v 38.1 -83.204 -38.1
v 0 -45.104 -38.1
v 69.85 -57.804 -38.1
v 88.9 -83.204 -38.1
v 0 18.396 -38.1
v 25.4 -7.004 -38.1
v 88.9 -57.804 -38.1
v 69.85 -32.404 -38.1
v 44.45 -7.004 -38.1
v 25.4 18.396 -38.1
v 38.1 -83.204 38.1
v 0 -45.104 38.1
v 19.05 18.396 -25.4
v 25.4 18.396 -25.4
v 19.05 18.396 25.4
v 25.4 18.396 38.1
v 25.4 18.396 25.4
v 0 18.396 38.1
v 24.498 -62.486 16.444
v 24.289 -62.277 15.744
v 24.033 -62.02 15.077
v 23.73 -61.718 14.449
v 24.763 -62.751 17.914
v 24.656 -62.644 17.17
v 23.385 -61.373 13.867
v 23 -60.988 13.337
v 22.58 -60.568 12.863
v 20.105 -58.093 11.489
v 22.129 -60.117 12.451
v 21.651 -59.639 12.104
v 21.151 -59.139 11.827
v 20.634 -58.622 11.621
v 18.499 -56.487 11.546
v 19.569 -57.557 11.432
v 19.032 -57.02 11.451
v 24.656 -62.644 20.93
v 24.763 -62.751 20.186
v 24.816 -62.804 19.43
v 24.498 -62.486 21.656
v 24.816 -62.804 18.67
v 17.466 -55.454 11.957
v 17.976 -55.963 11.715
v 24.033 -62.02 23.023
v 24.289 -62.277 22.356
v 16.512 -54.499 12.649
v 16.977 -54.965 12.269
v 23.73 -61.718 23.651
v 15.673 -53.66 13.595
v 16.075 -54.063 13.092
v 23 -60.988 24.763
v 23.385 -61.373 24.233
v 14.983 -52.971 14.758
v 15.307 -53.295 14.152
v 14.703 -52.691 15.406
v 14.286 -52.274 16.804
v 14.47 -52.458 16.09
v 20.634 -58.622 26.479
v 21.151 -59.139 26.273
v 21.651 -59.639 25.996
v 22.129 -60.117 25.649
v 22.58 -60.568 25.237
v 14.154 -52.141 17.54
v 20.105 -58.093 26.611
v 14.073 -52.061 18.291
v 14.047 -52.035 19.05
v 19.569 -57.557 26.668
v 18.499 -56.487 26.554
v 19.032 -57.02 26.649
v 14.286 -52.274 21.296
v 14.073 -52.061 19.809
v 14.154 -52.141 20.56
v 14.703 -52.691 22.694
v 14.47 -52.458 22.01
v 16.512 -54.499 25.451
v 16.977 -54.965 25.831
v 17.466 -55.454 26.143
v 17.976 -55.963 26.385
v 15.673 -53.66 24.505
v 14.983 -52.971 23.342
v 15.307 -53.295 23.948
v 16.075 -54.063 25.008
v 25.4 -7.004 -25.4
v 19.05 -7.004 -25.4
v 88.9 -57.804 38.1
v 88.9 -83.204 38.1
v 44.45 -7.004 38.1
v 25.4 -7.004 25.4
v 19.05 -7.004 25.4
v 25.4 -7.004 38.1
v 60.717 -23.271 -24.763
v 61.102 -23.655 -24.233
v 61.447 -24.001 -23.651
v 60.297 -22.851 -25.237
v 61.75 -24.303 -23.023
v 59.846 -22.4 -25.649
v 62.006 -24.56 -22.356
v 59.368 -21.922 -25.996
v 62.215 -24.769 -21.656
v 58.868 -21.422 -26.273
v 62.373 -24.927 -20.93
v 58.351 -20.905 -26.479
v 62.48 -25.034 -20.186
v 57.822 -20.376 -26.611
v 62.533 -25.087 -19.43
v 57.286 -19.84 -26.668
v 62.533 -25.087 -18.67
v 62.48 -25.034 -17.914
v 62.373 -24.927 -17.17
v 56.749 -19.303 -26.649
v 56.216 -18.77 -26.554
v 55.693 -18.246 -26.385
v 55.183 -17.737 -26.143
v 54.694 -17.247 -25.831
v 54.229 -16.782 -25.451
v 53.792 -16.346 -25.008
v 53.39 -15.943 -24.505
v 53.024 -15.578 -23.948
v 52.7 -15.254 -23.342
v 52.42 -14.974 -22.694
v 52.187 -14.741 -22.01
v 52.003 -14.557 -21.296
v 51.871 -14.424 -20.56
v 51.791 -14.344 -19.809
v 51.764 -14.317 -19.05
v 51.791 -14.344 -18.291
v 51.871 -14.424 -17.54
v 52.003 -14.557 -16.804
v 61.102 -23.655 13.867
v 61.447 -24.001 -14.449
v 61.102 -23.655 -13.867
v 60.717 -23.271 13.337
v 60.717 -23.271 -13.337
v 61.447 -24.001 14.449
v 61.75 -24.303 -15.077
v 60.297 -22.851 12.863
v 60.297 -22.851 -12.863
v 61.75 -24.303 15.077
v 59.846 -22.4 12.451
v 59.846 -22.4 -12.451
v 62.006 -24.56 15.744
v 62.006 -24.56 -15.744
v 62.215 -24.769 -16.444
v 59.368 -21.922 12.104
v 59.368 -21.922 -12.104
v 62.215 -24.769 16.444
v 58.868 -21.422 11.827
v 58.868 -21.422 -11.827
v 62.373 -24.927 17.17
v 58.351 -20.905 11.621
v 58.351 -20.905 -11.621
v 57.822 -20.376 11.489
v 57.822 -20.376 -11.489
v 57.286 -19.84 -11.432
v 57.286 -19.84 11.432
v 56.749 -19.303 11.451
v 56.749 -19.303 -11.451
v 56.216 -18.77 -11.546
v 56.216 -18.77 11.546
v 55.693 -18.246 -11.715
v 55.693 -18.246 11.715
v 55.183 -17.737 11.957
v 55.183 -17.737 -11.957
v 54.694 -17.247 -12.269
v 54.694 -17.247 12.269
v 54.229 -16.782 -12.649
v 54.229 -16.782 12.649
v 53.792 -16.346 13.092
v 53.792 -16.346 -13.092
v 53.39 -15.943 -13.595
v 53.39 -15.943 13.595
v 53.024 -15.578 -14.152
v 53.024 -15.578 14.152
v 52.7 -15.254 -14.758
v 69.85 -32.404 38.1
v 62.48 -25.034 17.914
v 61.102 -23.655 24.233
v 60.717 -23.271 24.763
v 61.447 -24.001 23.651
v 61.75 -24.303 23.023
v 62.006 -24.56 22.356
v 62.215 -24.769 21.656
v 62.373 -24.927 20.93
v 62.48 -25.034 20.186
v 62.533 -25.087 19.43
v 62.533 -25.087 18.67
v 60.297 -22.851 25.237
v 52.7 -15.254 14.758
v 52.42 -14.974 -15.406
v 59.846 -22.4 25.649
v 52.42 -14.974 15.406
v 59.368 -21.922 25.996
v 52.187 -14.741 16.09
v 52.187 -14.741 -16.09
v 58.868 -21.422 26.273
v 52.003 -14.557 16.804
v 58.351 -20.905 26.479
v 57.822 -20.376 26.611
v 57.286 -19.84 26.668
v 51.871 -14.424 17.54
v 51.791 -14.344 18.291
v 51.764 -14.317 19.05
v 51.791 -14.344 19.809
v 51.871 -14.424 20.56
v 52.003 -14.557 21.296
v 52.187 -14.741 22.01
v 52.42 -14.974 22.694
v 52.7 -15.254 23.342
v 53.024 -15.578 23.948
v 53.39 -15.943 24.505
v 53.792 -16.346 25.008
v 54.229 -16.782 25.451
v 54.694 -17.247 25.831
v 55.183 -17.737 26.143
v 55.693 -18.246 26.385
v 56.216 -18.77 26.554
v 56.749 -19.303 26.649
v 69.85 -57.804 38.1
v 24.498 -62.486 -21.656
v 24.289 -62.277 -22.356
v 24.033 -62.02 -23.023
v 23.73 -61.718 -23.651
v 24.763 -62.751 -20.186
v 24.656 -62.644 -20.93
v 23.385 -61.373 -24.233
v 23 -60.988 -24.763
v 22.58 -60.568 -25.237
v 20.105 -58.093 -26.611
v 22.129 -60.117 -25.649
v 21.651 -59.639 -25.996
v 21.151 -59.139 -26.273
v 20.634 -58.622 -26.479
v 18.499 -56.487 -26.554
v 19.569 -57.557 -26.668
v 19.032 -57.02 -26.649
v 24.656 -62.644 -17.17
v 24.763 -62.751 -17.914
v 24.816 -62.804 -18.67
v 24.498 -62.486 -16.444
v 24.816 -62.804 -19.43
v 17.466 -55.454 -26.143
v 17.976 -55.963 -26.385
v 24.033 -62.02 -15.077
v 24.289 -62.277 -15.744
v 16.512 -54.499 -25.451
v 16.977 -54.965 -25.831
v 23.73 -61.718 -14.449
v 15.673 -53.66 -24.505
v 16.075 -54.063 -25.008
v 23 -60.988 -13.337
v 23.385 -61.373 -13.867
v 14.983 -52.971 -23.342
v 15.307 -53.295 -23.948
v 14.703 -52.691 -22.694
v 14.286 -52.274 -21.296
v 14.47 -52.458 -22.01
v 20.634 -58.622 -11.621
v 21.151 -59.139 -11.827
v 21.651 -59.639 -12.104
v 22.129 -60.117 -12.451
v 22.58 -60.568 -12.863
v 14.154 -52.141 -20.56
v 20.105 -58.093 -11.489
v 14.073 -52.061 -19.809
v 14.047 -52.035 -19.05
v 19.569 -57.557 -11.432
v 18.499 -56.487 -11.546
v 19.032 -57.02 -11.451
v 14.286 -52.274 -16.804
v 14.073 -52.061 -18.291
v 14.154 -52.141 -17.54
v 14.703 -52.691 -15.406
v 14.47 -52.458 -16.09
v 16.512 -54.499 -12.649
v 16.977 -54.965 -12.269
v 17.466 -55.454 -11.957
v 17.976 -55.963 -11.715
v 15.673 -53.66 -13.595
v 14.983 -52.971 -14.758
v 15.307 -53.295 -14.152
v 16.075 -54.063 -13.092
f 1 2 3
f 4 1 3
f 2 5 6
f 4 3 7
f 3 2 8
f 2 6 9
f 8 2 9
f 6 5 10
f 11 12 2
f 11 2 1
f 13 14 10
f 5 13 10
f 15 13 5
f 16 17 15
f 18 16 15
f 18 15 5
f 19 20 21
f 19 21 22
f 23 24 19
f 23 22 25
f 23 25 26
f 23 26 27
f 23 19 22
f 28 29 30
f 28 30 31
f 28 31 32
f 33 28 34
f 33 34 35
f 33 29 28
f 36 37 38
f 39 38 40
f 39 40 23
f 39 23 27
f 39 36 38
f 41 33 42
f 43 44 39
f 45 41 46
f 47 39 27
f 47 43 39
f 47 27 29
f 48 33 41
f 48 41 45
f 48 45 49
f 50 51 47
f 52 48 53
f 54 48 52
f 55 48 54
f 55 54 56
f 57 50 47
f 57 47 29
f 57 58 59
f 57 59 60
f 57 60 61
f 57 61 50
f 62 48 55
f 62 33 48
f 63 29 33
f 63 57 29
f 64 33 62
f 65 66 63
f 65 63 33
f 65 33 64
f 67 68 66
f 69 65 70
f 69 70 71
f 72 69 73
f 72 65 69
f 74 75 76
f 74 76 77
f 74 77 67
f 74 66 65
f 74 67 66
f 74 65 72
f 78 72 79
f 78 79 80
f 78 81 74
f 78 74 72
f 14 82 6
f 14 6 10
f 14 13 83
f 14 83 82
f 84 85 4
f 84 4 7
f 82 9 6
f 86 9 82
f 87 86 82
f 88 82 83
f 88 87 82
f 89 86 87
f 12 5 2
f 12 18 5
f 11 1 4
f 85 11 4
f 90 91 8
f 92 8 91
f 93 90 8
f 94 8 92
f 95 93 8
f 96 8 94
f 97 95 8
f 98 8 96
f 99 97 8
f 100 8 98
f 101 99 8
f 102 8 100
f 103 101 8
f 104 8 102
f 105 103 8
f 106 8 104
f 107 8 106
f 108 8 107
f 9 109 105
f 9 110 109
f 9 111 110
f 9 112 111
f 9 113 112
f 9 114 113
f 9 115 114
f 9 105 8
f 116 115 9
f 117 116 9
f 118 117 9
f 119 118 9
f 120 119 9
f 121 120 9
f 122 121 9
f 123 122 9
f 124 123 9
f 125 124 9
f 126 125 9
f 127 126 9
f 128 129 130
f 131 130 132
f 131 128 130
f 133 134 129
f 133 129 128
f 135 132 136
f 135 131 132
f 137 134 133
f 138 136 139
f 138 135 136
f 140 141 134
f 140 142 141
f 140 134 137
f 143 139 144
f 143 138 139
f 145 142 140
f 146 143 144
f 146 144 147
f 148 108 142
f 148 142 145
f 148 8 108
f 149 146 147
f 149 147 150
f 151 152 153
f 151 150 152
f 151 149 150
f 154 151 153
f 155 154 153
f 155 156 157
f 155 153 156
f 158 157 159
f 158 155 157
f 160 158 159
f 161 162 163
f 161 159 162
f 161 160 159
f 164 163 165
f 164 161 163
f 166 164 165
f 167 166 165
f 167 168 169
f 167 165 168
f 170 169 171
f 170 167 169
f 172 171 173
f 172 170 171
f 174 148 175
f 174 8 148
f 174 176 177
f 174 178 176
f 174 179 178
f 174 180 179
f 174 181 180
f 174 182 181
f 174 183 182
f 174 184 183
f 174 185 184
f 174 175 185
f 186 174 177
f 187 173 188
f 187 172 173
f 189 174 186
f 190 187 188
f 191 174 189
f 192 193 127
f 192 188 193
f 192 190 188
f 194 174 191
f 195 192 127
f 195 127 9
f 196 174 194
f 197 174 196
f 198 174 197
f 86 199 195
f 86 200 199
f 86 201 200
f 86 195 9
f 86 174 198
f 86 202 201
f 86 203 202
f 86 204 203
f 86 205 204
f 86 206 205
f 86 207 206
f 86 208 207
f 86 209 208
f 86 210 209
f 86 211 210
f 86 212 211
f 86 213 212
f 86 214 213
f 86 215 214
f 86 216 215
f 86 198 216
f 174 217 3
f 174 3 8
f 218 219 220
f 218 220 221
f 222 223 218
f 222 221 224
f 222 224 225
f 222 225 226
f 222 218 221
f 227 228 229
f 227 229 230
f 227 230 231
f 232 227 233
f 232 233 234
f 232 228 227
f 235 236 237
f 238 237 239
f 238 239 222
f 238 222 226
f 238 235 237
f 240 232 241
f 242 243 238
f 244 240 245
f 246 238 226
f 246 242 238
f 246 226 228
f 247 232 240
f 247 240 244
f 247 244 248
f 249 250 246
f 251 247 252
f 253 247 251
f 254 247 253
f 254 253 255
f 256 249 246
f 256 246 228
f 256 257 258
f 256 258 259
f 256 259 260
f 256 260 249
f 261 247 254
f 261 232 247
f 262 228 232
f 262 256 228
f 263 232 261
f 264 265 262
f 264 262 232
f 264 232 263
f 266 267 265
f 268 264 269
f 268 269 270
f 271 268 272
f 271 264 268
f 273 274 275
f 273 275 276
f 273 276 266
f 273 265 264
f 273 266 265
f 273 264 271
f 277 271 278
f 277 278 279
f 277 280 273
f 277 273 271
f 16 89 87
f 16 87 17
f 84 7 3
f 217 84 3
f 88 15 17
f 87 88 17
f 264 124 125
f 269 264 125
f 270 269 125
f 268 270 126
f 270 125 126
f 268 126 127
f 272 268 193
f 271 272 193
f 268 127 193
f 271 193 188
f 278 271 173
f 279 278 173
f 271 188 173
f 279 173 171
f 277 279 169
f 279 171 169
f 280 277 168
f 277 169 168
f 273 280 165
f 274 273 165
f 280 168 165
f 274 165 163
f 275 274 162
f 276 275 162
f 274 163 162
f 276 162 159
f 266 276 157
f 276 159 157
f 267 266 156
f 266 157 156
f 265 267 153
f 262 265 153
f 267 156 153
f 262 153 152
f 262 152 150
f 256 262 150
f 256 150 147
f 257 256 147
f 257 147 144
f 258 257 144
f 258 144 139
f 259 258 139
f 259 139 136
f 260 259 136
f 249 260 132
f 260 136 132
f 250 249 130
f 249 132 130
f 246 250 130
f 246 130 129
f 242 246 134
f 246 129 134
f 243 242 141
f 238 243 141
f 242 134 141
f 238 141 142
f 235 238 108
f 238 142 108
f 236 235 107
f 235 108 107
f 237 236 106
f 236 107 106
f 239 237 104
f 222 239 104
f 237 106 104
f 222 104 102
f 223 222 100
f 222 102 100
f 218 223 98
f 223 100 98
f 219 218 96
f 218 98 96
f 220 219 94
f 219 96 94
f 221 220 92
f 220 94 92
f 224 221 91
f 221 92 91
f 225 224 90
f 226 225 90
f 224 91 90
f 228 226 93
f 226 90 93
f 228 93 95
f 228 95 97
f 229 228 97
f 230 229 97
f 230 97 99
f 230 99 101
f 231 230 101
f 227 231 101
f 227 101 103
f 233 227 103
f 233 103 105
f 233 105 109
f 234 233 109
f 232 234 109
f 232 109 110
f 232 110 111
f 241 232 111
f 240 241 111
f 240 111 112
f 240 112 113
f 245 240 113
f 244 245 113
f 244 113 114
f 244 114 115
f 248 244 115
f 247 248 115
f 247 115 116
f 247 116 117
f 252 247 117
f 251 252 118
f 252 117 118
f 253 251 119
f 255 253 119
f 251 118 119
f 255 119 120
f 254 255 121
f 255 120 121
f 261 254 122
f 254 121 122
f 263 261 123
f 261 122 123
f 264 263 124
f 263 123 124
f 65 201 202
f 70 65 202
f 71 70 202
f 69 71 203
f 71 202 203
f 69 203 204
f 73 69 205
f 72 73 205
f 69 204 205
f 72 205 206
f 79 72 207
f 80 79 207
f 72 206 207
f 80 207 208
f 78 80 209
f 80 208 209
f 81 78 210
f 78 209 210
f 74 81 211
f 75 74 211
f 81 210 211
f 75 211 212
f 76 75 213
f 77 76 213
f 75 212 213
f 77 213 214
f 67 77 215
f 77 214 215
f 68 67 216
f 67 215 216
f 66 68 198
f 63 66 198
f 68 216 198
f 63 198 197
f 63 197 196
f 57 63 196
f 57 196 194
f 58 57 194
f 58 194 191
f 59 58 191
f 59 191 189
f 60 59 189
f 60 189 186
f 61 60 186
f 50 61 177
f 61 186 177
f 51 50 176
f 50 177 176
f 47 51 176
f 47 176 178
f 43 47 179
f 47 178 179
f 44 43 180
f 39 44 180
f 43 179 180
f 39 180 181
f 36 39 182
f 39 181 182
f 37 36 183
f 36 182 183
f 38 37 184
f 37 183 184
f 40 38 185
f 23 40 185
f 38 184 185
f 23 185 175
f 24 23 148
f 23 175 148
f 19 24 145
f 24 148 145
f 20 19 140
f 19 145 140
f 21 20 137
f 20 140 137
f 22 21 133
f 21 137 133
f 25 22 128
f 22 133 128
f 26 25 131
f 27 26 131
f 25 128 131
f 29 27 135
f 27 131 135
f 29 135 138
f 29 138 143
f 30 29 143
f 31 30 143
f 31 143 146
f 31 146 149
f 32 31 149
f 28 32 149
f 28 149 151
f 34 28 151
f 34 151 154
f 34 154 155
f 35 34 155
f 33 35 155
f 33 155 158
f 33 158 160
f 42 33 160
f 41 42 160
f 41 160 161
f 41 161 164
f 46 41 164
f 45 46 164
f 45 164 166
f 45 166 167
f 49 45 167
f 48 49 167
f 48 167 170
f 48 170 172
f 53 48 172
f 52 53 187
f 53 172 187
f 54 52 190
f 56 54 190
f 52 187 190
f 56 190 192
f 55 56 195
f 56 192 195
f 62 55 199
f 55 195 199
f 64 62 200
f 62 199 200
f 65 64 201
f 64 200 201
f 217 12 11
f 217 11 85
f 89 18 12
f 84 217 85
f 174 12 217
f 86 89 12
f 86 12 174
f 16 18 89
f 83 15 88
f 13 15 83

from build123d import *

# Parameters (mm, degrees)
BOSS_EXTRUDE2_DEPTH = 38.1
SKETCH7_W           = 6.35
SKETCH7_H           = 50.8
CUT_EXTRUDE1_DEPTH  = 25.4
SKETCH8_R           = 7.62
CUT_EXTRUDE3_DEPTH  = 53.34


with BuildPart() as part:
    # Sketch3 → Boss-Extrude2 (new, symmetric)
    with BuildSketch(Plane.XY):
        Polygon((0, 18.396289168), (0, -45.103710832), (38.1, -83.203710832), (88.9, -83.203710832), (88.9, -57.803710832), (69.85, -57.803710832), (69.85, -32.403710832), (44.45, -7.003710832), (25.4, -7.003710832), (25.4, 18.396289168), align=None)
    extrude(amount=BOSS_EXTRUDE2_DEPTH, both=True)

    # Sketch7 → Cut-Extrude1 (cut)
    with BuildSketch(Plane(origin=(0, 18.396289168, 0), x_dir=(1, 0, 0), z_dir=(0, 1, 0))):
        with Locations((22.225, 0)):
            Rectangle(SKETCH7_W, SKETCH7_H)
    extrude(amount=-CUT_EXTRUDE1_DEPTH, mode=Mode.SUBTRACT)

    # Sketch8 → Cut-Extrude3 (cut)
    with BuildSketch(Plane(origin=(18.723144584, 18.723144584, 0), x_dir=(0, 0, -1), z_dir=(0.7071067811865487, 0.7071067811865465, 0))):
        with Locations(Location((-19.05, -54.346492331, 0), (0, 0, 90))):
            Circle(SKETCH8_R)
        with Locations(Location((19.05, -54.346492331, 0), (0, 0, 90))):
            Circle(SKETCH8_R)
    extrude(amount=-CUT_EXTRUDE3_DEPTH, mode=Mode.SUBTRACT)


solid = part.part
